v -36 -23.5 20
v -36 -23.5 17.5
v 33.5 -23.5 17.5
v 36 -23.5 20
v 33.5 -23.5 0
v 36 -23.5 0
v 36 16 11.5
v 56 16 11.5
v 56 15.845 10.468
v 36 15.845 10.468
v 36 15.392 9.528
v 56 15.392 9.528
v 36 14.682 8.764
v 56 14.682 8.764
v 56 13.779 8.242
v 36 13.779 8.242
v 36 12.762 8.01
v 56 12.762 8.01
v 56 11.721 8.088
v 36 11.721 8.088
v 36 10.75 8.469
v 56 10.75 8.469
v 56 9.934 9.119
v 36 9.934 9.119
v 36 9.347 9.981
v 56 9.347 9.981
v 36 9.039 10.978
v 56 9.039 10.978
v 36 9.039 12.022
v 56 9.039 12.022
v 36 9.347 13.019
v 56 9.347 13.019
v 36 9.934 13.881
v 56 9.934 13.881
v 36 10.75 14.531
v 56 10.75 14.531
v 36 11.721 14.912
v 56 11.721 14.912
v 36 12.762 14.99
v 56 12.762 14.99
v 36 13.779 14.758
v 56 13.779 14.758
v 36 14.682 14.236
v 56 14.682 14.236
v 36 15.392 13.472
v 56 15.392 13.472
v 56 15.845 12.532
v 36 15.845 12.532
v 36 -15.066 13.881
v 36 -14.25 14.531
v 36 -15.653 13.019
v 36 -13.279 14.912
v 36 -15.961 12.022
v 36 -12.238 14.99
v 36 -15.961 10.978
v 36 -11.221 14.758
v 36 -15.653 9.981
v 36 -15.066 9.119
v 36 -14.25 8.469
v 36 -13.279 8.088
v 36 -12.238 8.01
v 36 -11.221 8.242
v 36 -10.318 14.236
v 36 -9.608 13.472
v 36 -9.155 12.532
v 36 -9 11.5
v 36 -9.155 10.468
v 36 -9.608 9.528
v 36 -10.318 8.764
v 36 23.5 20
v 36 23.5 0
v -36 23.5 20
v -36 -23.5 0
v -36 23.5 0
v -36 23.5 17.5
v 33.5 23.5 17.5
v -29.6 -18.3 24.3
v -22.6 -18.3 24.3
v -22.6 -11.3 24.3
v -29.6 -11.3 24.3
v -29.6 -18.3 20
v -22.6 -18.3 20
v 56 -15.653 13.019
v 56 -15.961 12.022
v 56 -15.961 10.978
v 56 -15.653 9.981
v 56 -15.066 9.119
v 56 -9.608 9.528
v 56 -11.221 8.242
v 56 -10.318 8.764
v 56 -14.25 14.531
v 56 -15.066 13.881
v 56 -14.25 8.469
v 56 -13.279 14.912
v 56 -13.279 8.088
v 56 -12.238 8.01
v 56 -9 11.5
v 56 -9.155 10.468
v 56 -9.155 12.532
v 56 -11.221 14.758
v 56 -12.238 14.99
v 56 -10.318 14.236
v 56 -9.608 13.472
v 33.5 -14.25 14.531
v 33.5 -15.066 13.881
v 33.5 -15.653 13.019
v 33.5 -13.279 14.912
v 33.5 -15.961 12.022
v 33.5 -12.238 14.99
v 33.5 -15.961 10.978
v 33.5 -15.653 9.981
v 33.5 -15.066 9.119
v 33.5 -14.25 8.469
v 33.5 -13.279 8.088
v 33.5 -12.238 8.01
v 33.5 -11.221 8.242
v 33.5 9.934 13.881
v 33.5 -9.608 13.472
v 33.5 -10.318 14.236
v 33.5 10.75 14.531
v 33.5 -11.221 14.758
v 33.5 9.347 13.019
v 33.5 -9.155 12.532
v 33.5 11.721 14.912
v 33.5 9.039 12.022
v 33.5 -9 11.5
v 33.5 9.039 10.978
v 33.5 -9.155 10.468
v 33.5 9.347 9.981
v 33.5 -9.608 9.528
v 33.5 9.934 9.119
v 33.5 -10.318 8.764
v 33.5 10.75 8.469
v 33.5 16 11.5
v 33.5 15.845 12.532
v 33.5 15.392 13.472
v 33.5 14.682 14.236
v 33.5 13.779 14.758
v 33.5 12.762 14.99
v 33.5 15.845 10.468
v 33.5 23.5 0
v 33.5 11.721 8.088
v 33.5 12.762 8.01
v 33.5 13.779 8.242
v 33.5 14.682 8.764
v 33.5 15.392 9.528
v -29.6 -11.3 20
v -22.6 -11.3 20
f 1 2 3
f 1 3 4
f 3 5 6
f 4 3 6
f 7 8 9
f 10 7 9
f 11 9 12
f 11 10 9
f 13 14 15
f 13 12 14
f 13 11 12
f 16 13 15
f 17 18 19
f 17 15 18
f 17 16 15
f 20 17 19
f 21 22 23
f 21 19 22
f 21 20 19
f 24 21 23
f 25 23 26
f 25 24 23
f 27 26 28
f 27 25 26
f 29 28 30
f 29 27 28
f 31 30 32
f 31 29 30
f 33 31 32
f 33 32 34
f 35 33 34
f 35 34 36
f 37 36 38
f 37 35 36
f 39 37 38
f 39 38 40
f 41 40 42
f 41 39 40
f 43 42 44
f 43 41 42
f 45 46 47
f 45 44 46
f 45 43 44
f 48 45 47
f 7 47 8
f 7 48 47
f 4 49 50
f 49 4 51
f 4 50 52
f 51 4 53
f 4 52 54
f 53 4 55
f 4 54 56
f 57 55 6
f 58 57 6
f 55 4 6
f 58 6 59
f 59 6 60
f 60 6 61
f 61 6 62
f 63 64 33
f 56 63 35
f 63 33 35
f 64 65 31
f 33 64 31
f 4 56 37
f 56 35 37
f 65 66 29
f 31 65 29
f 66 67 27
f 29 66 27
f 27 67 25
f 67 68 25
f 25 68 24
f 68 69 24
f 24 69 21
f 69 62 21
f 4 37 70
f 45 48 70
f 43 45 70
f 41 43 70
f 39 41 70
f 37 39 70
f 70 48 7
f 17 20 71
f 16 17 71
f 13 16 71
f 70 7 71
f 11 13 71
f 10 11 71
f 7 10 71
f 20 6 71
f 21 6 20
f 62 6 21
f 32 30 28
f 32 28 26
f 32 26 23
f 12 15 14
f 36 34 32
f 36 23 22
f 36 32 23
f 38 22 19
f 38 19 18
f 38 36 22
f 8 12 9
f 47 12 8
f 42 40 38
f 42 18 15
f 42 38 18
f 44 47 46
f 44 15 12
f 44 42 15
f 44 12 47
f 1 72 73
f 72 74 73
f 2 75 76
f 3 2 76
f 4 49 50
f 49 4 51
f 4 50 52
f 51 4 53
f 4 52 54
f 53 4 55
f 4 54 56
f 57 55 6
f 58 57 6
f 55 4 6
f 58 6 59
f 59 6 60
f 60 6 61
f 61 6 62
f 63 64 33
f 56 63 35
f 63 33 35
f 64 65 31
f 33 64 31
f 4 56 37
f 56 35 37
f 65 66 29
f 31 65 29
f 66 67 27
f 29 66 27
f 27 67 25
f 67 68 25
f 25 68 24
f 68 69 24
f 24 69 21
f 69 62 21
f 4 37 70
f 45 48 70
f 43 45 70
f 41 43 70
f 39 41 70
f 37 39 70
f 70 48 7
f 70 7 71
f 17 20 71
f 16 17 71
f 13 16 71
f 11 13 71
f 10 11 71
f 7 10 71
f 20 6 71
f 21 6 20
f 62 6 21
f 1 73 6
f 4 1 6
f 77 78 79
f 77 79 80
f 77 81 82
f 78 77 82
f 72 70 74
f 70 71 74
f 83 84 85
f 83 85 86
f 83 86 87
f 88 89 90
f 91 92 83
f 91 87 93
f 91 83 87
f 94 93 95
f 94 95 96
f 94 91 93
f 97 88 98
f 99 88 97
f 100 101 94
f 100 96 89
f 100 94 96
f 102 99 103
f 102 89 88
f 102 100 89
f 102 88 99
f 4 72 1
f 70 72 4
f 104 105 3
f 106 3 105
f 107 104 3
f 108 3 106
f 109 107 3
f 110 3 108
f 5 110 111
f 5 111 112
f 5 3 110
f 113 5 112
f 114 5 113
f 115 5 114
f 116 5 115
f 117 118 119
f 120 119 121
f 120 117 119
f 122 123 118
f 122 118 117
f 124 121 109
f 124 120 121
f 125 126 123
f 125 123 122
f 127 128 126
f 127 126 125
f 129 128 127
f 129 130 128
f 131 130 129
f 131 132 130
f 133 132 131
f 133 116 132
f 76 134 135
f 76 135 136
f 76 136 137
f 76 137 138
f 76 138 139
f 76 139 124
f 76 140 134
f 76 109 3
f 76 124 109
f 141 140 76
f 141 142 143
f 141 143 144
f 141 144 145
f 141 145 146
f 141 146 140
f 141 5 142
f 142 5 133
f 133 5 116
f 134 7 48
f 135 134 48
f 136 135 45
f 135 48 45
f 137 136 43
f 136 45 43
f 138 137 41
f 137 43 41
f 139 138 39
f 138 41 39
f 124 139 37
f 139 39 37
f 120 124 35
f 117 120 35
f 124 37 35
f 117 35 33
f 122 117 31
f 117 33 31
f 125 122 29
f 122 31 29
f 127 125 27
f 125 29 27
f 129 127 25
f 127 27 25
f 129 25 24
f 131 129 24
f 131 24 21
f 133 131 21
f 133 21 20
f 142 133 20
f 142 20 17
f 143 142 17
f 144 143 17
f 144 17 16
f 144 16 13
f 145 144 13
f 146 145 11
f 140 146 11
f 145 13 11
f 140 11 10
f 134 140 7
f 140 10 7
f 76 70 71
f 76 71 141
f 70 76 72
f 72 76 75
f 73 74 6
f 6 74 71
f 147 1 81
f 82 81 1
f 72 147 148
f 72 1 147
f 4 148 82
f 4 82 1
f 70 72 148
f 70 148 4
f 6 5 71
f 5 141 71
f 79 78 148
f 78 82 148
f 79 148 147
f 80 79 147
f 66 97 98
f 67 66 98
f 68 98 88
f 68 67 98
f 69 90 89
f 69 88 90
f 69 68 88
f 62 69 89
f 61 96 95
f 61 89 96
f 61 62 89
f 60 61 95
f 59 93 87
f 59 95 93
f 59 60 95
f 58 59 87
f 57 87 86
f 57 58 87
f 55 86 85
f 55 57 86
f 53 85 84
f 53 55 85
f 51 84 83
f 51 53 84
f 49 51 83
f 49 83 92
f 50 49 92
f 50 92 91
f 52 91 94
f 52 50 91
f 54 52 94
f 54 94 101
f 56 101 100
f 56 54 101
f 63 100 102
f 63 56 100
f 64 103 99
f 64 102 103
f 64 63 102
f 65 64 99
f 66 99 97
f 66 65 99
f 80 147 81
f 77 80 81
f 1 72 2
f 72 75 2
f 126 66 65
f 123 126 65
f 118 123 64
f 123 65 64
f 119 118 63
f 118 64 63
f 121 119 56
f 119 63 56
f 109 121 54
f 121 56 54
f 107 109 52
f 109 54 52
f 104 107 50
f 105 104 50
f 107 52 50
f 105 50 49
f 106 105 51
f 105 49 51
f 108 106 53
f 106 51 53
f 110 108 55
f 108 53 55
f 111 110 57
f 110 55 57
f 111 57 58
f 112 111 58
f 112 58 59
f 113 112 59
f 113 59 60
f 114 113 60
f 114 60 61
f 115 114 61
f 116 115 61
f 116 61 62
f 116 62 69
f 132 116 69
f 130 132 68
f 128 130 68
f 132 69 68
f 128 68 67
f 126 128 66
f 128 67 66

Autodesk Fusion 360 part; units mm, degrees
sketch "Board size" plane through (0, 0, 0) normal (0, 0, 1) x (1, 0, 0)
  line L0 (36, 23.5) -> (-36, 23.5)
  line L1 (-36, 23.5) -> (-36, -23.5)
  line L2 (-36, -23.5) -> (36, -23.5)
  line L3 (36, -23.5) -> (36, 23.5)
  line L4 (36, 23.5) -> (-36, -23.5) construction
  line L5 (-36, 23.5) -> (36, -23.5) construction
  dimension "d1" = 72
  dimension "d2" = 47
sketch "Pot side" plane through (36, 0, 0) normal (1, 0, 0) x (0, 1, 0)
  line L0 (-23.5, 0) -> (23.5, 0)
  line L1 (23.5, 0) -> (23.5, 22)
  line L2 (23.5, 22) -> (-23.5, 22)
  line L3 (-23.5, 22) -> (-23.5, 0)
  circle A0 centre (-12.5, 11.5) radius 3.5
  line L4 (0, 0) -> (0, 22) construction
  circle A1 centre (12.5, 11.5) radius 3.5
  line L5 (0, 0) -> (-12.5, 0)
  line L6 (-12.5, 0) -> (-12.5, 11.5) construction
  line L7 (-12.5, 11.5) -> (0, 11.5) construction
  line L8 (0, 11.5) -> (0, 0)
  dimension "d7" = 7
  dimension "d20" = 12.5
  dimension "d21" = 11.5
sketch "Sketch3" plane through (0, 0, 0) normal (0, 0, -1) x (1, 0, 0)
  line L0 (36, -23.5) -> (36, 23.5)
  line L1 (36, 23.5) -> (-36, 23.5)
  line L2 (-36, 23.5) -> (-36, -23.5)
  line L3 (-36, -23.5) -> (36, -23.5)
  line L4 (-36, 23.5) -> (-33, 23.5)
  line L5 (-36, 20.5) -> (-36, 23.5)
  circle A0 centre (-33, 20.5) radius 1.7
  line L6 (-36, 0) -> (36, 0) construction
  line L7 (0, 23.5) -> (0, -23.5) construction
  circle A1 centre (33, 20.5) radius 1.7
  circle A2 centre (33, -20.5) radius 1.7
  circle A3 centre (-33, -20.5) radius 1.7
  line L8 (0, 0) -> (-33, 0) construction
  line L9 (-33, 0) -> (-33, 20.5) construction
  line L10 (-33, 20.5) -> (0, 20.5) construction
  line L11 (0, 20.5) -> (0, 0) construction
  dimension "d10" = 3.4
  dimension "d23" = 33
  dimension "d24" = 20.5
extrude "Extrude1" add sketch "Board size" along normal blind 20 makes body 1 in component "Box"
extrude "Extrude9" add sketch "Pot side" along normal blind 20 contours A0 | A1 bodies 1 in component "Box"
extrude "Extrude1'" add sketch "Board size" along normal blind 20 separate body makes body 2 in component "Lid"
shell "Shell1" thickness 2.5 removed faces 4 at (-12, -23.5, 6.6667) at (-36, 7.8333, 6.6667) at (12, 23.5, 6.6667) at (-12, 7.8333, 0) on bodies 2 in component "Lid"
extrude "Extrude2" cut sketch "Pot side" against normal blind 2.5 contours A0 | A1 bodies 2 in component "Lid"
sketch "Sketch1" plane through (0, -23.5, 0) normal (0, -1, 0) x (1, 0, 0) in component "Box"
  line L0 (-36, 0) -> (36, 0)
  line L1 (36, 0) -> (36, 20)
  line L2 (36, 20) -> (-36, 20)
  line L3 (-36, 20) -> (-36, 0)
  line L4 (36, 0) -> (36, 2.5)
  line L5 (36, 2.5) -> (34.5, 1)
  line L6 (34.5, 1) -> (34.5, 22.0494)
  line L7 (36, 22.0494) -> (34.5, 22.0494)
  line L8 (34.5, 1.5) -> (35, 1.5)
  dimension "d76" = 45
sketch "Sketch8" plane through (0, 0, 20) normal (0, 0, 1) x (-1, 0, 0)
  line L0 (-36, 23.5) -> (-36, -23.5)
  line L1 (-36, -23.5) -> (36, -23.5)
  line L2 (36, -23.5) -> (36, 23.5)
  line L3 (36, 23.5) -> (-36, 23.5)
  line L4 (22.6, 18.3) -> (22.6, 11.3)
  line L5 (29.6, 18.3) -> (22.6, 18.3)
  line L6 (29.6, 11.3) -> (29.6, 18.3)
  line L7 (22.6, 11.3) -> (29.6, 11.3)
  line L8 (22.6, 11.3) -> (0, 11.3)
  line L9 (22.6, 0) -> (22.6, 11.3)
  circle A0 centre (33, -20.5) radius 1.7
  circle A1 centre (-33, -20.5) radius 1.7
  circle A2 centre (33, 20.5) radius 1.7
  line L10 (33, 0) -> (33, 20.5)
  line L11 (33, 20.5) -> (0, 20.5)
  line L12 (0, 0) -> (0, 23.5) construction
  line L13 (0, 0) -> (36, 0) construction
  line L14 (0, 11.3) -> (22.6, 11.3) construction
  line L15 (22.6, 0) -> (22.6, 11.3) construction
  line L16 (33, 0) -> (33, 20.5) construction
  line L17 (0, 20.5) -> (33, 20.5) construction
  line L18 (29.6, 11.3) -> (22.6, 11.3)
  line L19 (22.6, 11.3) -> (22.6, 18.3)
  line L20 (22.6, 18.3) -> (29.6, 18.3)
  line L21 (29.6, 18.3) -> (29.6, 11.3)
  circle A3 centre (33, 20.5) radius 1.7
  circle A4 centre (-33, 20.5) radius 1.7
  point P0 (22.6, 0)
  point P1 (0, 11.3)
  point P2 (33, 20.5)
  point P3 (-33, -20.5)
  point P4 (-33, 20.5)
  dimension "d120" = 20.5
  dimension "d121" = 33
extrude "Extrude10" add sketch "Sketch8" along normal blind 4.3 contours L4 L5 L6 L7 L18 L19 L20 L21 bodies 1 in component "Box"
sketch "Sketch9" plane through (0, 0, 0) normal (0, 0, -1) x (1, 0, 0)
copy_body "Body->Comp1" bodies 1 removing the originals makes body 3 in component "Board blus button and pots"
component "Box" placed x (1, 0, 0) y (0, 1, 0) z (0, 0, 1) at (0, 0, 0)
component "Lid" placed x (1, 0, 0) y (0, 1, 0) z (0, 0, 1) at (0, 0, 0)
component "Board blus button and pots" placed x (1, 0, 0) y (0, 1, 0) z (0, 0, 1) at (0, 0, 0) in component "Box"
equation "d1 = depth"
equation "d2 = width"
equation "d7 = PotHolesize"
equation "d10 = PostDiameter"
equation "d20 = PotdistanceFromcentre"
equation "d21 = PotHeightfrombottom"
equation "d23 = PostdistanceDepth"
equation "d24 = PostDistanceWidth"
equation "width = 47 mm"
equation "depth = 72 mm"
equation "PotHeightfrombottom = 11.5 mm"
equation "PotdistanceFromcentre = 12.5 mm"
equation "PotHolesize = 7 mm"
equation "PostDistanceWidth = 20.5 mm"
equation "PostdistanceDepth = 33 mm"
equation "PostDiameter = 3.4 mm"
equation "shell = 2.5 mm"
equation "gap = 0.2 mm"
equation "squarebuttonhole = 7 mm"
equation "squarebuttonholedistWidth = 22.6 mm"
equation "squarebuttonholedisDepth = 11.3 mm"
equation "height = 20 mm"
equation "d68 = height"
equation "d71 = height"
equation "d73 = shell"
equation "d74 = -shell"
equation "USBCableHole = 3.4 mm"
